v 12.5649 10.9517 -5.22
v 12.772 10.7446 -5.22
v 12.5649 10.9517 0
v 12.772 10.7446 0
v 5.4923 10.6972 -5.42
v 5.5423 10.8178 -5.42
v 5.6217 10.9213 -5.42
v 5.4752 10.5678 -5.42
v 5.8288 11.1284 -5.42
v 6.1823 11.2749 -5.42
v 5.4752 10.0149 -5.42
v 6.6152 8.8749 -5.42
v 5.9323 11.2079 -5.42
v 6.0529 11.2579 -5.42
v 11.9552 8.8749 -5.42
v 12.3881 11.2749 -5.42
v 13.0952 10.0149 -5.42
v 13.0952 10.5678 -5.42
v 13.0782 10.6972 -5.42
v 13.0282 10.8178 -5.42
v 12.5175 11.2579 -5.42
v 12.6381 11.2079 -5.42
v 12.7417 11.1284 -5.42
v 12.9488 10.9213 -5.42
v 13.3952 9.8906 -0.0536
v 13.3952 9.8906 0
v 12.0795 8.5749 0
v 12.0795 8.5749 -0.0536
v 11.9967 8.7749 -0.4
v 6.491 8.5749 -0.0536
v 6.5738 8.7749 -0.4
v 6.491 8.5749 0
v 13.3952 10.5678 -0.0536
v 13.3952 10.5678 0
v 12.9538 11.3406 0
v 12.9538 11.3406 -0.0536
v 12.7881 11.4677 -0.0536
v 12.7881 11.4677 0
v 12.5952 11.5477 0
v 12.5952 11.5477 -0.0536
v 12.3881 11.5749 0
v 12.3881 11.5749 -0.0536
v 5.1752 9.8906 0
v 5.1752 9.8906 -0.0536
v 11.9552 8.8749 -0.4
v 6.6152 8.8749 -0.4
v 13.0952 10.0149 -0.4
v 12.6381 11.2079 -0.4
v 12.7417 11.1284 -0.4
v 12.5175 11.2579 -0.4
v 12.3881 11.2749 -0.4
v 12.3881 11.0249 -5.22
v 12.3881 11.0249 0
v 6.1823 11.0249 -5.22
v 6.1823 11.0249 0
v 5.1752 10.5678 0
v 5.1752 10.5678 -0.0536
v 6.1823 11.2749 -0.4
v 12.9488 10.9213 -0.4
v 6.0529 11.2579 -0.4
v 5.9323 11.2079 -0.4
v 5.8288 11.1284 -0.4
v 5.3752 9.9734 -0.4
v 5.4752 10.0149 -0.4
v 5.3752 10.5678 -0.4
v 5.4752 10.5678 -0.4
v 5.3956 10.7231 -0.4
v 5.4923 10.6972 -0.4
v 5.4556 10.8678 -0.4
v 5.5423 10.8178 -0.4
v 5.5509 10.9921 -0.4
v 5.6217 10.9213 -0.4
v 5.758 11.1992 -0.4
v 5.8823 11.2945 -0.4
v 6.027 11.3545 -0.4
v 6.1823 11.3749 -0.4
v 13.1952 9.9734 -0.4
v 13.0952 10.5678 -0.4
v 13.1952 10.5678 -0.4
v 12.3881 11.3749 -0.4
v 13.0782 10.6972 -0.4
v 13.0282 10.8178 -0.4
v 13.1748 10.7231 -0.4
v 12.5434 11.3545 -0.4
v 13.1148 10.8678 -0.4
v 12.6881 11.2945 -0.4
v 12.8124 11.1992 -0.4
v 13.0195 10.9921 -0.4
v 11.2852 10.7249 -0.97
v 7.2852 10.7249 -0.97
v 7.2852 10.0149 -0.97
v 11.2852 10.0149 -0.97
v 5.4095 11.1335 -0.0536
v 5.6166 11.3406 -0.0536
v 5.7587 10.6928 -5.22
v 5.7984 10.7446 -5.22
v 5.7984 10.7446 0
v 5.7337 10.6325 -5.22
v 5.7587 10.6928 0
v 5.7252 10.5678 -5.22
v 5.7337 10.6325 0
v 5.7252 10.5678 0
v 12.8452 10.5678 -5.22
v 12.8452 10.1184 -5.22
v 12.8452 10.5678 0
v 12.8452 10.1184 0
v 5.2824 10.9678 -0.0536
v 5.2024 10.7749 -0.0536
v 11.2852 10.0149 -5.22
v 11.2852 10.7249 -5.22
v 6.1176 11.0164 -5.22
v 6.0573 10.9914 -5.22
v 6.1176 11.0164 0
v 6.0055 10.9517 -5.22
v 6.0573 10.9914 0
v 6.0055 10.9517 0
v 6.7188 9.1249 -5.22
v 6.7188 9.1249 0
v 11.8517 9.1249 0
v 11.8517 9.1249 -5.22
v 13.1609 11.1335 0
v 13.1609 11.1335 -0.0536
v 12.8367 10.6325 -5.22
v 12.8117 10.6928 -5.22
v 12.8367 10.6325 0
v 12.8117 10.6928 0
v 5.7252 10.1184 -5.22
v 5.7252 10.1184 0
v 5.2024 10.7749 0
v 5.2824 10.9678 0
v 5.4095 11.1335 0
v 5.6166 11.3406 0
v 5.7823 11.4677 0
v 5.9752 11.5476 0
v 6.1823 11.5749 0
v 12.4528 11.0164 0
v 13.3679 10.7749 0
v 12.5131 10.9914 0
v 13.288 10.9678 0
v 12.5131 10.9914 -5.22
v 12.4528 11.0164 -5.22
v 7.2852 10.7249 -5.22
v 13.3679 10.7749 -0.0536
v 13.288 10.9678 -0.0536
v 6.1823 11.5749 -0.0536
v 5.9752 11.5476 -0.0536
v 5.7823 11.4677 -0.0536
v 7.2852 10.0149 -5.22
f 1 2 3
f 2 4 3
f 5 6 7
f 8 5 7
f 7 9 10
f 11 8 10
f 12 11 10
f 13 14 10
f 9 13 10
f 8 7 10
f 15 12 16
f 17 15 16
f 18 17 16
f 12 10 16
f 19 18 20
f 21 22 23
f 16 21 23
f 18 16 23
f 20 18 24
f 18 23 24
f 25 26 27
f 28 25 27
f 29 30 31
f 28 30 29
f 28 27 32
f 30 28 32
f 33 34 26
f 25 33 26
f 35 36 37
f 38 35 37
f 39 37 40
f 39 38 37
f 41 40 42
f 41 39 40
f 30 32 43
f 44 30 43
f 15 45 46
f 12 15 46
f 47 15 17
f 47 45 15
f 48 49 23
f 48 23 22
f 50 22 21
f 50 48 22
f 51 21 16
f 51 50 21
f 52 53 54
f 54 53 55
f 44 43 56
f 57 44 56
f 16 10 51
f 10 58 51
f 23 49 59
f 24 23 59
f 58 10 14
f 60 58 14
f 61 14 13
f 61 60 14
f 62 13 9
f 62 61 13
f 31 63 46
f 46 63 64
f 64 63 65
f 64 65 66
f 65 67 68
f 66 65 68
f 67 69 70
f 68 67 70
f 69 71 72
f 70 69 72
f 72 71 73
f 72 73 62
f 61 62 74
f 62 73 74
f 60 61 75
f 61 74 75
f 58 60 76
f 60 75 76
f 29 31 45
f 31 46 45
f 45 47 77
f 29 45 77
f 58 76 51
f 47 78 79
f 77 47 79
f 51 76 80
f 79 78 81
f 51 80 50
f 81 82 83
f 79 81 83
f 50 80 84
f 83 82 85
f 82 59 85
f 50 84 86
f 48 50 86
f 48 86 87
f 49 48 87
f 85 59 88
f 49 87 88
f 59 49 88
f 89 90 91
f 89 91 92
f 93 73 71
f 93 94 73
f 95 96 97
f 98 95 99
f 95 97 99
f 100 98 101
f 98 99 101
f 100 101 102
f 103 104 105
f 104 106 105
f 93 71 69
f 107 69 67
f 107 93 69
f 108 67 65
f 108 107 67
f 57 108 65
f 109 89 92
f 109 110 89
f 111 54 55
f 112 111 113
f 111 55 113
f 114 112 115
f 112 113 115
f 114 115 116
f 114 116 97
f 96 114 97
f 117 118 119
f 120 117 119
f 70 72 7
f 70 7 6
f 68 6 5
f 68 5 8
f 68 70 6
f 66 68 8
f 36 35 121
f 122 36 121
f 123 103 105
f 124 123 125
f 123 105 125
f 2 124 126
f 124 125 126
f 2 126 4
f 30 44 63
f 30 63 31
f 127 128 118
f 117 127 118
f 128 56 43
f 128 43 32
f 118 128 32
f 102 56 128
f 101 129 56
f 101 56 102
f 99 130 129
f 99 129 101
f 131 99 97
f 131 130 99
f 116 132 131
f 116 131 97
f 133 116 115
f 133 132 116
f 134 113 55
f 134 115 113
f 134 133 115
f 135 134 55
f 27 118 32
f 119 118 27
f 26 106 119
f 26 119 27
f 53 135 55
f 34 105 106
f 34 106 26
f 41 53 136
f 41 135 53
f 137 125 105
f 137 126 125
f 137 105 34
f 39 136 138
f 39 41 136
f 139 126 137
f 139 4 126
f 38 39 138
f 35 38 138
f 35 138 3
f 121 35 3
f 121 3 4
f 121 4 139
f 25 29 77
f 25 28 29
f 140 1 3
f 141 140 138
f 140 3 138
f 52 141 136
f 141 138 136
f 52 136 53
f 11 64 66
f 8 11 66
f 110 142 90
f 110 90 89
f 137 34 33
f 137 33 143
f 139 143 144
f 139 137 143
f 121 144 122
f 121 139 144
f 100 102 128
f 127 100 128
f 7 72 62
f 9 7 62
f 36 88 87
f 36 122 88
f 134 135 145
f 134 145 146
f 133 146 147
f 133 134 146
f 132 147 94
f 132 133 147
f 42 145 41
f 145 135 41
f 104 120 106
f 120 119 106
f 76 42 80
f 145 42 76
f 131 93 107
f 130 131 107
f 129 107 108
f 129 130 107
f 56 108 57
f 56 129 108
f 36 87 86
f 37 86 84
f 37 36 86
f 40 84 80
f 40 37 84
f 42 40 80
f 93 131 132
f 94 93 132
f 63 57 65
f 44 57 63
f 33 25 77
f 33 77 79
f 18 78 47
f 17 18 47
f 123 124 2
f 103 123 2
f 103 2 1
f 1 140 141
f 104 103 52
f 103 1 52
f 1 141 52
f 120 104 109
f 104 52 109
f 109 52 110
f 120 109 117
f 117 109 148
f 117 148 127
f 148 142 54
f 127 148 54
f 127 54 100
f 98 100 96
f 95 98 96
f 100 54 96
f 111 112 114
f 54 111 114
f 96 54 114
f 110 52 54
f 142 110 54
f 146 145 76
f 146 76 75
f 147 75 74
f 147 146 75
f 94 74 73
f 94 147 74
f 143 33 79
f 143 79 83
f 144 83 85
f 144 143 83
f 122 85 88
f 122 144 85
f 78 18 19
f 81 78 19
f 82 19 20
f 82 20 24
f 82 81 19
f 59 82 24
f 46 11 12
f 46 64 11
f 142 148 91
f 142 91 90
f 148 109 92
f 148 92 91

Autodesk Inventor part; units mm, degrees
ref_plane "YZ Plane" through (0, 0, 0) normal (1, 0, 0) x (0, 1, 0)
ref_plane "XZ Plane" through (0, 0, 0) normal (0, 1, 0) x (-1, 0, 0)
sketch "Sketch1" plane through (0, 0, 0) normal (0, 0, 1) x (1, 0, 0)
  line L0 (6.1823, 11.2749) -> (12.3881, 11.2749)
  line L1 (13.0952, 10.5678) -> (13.0952, 10.0149)
  line L2 (11.9552, 8.8749) -> (6.6152, 8.8749)
  line L3 (5.4752, 10.0149) -> (5.4752, 10.5678)
  line L4 (5.4752, 10.0149) -> (6.6152, 8.8749)
  line L5 (11.9552, 8.8749) -> (13.0952, 10.0149)
  line L6 (5.6217, 10.9213) -> (5.8288, 11.1284)
  line L7 (12.7417, 11.1284) -> (12.9488, 10.9213)
  arc A0 (6.1823, 11.2749) -> (5.8288, 11.1284) centre (6.1823, 10.7749) ccw
  arc A1 (5.6217, 10.9213) -> (5.4752, 10.5678) centre (5.9752, 10.5678) ccw
  arc A2 (12.7417, 11.1284) -> (12.3881, 11.2749) centre (12.3881, 10.7749) ccw
  arc A3 (13.0952, 10.5678) -> (12.9488, 10.9213) centre (12.5952, 10.5678) ccw
  line L8 (12.3881, 11.0249) -> (6.1823, 11.0249)
  arc A4 (6.1823, 11.0249) -> (6.0055, 10.9517) centre (6.1823, 10.7749) ccw
  line L9 (6.0055, 10.9517) -> (5.7984, 10.7446)
  arc A5 (5.7984, 10.7446) -> (5.7252, 10.5678) centre (5.9752, 10.5678) ccw
  line L10 (5.7252, 10.5678) -> (5.7252, 10.1184)
  line L11 (5.7252, 10.1184) -> (6.7188, 9.1249)
  line L12 (6.7188, 9.1249) -> (11.8517, 9.1249)
  line L13 (11.8517, 9.1249) -> (12.8452, 10.1184)
  line L14 (12.8452, 10.1184) -> (12.8452, 10.5678)
  arc A6 (12.8452, 10.5678) -> (12.772, 10.7446) centre (12.5952, 10.5678) ccw
  line L15 (12.772, 10.7446) -> (12.5649, 10.9517)
  arc A7 (12.5649, 10.9517) -> (12.3881, 11.0249) centre (12.3881, 10.7749) ccw
  point P0 (0, 0)
  point P1 (13.0952, 8.8749)
  point P2 (5.4752, 8.8749)
  point P3 (5.4752, 11.2749)
  point P4 (13.0952, 11.2749)
  point P5 (5.4752, 10.7749)
  point P6 (5.9752, 11.2749)
  point P7 (12.5952, 11.2749)
  point P8 (13.0952, 10.7749)
  dimension "d0" = 7.62
  dimension "d1" = 2.4
  dimension "d3" = 1.14
  dimension "d4" = 1.14
  dimension "d5" = 1.14
  dimension "d6" = 1.14
  dimension "d7" = 0.5
  dimension "d8" = 0.5
  dimension "d9" = 0.5
  dimension "d10" = 0.5
  dimension "d11" = 0.5
  dimension "d12" = 0.25
extrude "Extrusion1" add sketch "Sketch1" against normal blind 5.42
sketch "Sketch2" plane through (0, 0, -5.42) normal (0, 0, -1) x (-1, 0, 0)
  line L0 (-12.8452, 10.1184) -> (-12.8452, 10.5678) projected
  arc A0 (-12.772, 10.7446) -> (-12.8452, 10.5678) centre (-12.5952, 10.5678) ccw projected
  line L1 (-12.772, 10.7446) -> (-12.5649, 10.9517) projected
  arc A1 (-12.3881, 11.0249) -> (-12.5649, 10.9517) centre (-12.3881, 10.7749) ccw projected
  line L2 (-12.3881, 11.0249) -> (-6.1823, 11.0249) projected
  line L3 (-11.8517, 9.1249) -> (-12.8452, 10.1184) projected
  line L4 (-6.7188, 9.1249) -> (-11.8517, 9.1249) projected
  line L5 (-5.7252, 10.1184) -> (-6.7188, 9.1249) projected
  line L6 (-5.7252, 10.5678) -> (-5.7252, 10.1184) projected
  arc A2 (-5.7252, 10.5678) -> (-5.7984, 10.7446) centre (-5.9752, 10.5678) ccw projected
  arc A3 (-6.0055, 10.9517) -> (-6.1823, 11.0249) centre (-6.1823, 10.7749) ccw projected
  line L7 (-6.0055, 10.9517) -> (-5.7984, 10.7446) projected
extrude "Extrusion2" add sketch "Sketch2" against normal blind 0.2
sketch "Sketch3" plane through (0, 0, -5.22) normal (0, 0, 1) x (1, 0, 0)
  line L0 (7.2852, 10.7249) -> (11.2852, 10.7249)
  line L1 (11.2852, 10.7249) -> (11.2852, 10.0149)
  line L2 (11.2852, 10.0149) -> (7.2852, 10.0149)
  line L3 (7.2852, 10.0149) -> (7.2852, 10.7249)
  line L4 (6.1823, 11.0249) -> (12.3881, 11.0249) projected
  line L5 (9.2852, 11.0249) -> (9.2852, 10.7249)
  point P0 (9.2852, 10.3699)
  point P1 (9.2852, 10.7249)
  dimension "d17" = 4
  dimension "d18" = 0.71
  dimension "d19" = 0.3
extrude "Extrusion3" add sketch "Sketch3" along normal blind 4.25
ref_plane "Work Plane1" through (9.2852, 10.0149, 0) normal (-1, 0, 0) x (0, 0, 1)
sketch "Sketch4" plane through (0, 0, 0) normal (0, 0, 1) x (1, 0, 0)
  arc A0 (5.6217, 10.9213) -> (5.4752, 10.5678) centre (5.9752, 10.5678) ccw
  line L0 (5.4752, 10.5678) -> (5.4752, 10.0149)
  line L1 (5.4752, 10.0149) -> (6.6152, 8.8749)
  line L2 (6.6152, 8.8749) -> (11.9552, 8.8749)
  line L3 (11.9552, 8.8749) -> (13.0952, 10.0149)
  line L4 (13.0952, 10.0149) -> (13.0952, 10.5678)
  arc A1 (13.0952, 10.5678) -> (12.9488, 10.9213) centre (12.5952, 10.5678) ccw
  line L5 (12.9488, 10.9213) -> (12.7417, 11.1284)
  arc A2 (12.7417, 11.1284) -> (12.3881, 11.2749) centre (12.3881, 10.7749) ccw
  line L6 (12.3881, 11.2749) -> (6.1823, 11.2749)
  arc A3 (6.1823, 11.2749) -> (5.8288, 11.1284) centre (6.1823, 10.7749) ccw
  line L7 (5.8288, 11.1284) -> (5.6217, 10.9213)
  line L8 (6.1823, 11.5749) -> (12.3881, 11.5749)
  arc A4 (12.9538, 11.3406) -> (12.3881, 11.5749) centre (12.3881, 10.7749) ccw
  line L9 (12.9538, 11.3406) -> (13.1609, 11.1335)
  arc A5 (13.3952, 10.5678) -> (13.1609, 11.1335) centre (12.5952, 10.5678) ccw
  line L10 (13.3952, 10.5678) -> (13.3952, 9.8906)
  line L11 (13.3952, 9.8906) -> (12.0795, 8.5749)
  line L12 (12.0795, 8.5749) -> (6.491, 8.5749)
  line L13 (6.491, 8.5749) -> (5.1752, 9.8906)
  line L14 (5.1752, 9.8906) -> (5.1752, 10.5678)
  arc A6 (5.4095, 11.1335) -> (5.1752, 10.5678) centre (5.9752, 10.5678) ccw
  line L15 (5.4095, 11.1335) -> (5.6166, 11.3406)
  arc A7 (6.1823, 11.5749) -> (5.6166, 11.3406) centre (6.1823, 10.7749) ccw
  dimension "d22" = 0.3
extrude "Extrusion4" add sketch "Sketch4" against normal blind 0.4
chamfer "Chamfer1" distance 0.2 angle 60 12 edges at (12.6943, 11.514, -0.4) (13.0573, 11.237, -0.4) (13.3343, 10.8739, -0.4) (13.3952, 10.2292, -0.4) (9.2852, 11.5749, -0.4) (5.8762, 11.514, -0.4) (5.5131, 11.237, -0.4) (5.2361, 10.8739, -0.4) (5.1752, 10.2292, -0.4) (12.7373, 9.2328, -0.4) (5.8331, 9.2328, -0.4) (9.2852, 8.5749, -0.4) measured on face at (10.3195, 11.4749, -0.4)
equation "\"d4\" = d3"
equation "\"d5\" = d3"
equation "\"d6\" = d5"
equation "\"d8\" = d7"
equation "\"d9\" = d7"
equation "\"d10\" = d9"
properties part number "USB Port"
